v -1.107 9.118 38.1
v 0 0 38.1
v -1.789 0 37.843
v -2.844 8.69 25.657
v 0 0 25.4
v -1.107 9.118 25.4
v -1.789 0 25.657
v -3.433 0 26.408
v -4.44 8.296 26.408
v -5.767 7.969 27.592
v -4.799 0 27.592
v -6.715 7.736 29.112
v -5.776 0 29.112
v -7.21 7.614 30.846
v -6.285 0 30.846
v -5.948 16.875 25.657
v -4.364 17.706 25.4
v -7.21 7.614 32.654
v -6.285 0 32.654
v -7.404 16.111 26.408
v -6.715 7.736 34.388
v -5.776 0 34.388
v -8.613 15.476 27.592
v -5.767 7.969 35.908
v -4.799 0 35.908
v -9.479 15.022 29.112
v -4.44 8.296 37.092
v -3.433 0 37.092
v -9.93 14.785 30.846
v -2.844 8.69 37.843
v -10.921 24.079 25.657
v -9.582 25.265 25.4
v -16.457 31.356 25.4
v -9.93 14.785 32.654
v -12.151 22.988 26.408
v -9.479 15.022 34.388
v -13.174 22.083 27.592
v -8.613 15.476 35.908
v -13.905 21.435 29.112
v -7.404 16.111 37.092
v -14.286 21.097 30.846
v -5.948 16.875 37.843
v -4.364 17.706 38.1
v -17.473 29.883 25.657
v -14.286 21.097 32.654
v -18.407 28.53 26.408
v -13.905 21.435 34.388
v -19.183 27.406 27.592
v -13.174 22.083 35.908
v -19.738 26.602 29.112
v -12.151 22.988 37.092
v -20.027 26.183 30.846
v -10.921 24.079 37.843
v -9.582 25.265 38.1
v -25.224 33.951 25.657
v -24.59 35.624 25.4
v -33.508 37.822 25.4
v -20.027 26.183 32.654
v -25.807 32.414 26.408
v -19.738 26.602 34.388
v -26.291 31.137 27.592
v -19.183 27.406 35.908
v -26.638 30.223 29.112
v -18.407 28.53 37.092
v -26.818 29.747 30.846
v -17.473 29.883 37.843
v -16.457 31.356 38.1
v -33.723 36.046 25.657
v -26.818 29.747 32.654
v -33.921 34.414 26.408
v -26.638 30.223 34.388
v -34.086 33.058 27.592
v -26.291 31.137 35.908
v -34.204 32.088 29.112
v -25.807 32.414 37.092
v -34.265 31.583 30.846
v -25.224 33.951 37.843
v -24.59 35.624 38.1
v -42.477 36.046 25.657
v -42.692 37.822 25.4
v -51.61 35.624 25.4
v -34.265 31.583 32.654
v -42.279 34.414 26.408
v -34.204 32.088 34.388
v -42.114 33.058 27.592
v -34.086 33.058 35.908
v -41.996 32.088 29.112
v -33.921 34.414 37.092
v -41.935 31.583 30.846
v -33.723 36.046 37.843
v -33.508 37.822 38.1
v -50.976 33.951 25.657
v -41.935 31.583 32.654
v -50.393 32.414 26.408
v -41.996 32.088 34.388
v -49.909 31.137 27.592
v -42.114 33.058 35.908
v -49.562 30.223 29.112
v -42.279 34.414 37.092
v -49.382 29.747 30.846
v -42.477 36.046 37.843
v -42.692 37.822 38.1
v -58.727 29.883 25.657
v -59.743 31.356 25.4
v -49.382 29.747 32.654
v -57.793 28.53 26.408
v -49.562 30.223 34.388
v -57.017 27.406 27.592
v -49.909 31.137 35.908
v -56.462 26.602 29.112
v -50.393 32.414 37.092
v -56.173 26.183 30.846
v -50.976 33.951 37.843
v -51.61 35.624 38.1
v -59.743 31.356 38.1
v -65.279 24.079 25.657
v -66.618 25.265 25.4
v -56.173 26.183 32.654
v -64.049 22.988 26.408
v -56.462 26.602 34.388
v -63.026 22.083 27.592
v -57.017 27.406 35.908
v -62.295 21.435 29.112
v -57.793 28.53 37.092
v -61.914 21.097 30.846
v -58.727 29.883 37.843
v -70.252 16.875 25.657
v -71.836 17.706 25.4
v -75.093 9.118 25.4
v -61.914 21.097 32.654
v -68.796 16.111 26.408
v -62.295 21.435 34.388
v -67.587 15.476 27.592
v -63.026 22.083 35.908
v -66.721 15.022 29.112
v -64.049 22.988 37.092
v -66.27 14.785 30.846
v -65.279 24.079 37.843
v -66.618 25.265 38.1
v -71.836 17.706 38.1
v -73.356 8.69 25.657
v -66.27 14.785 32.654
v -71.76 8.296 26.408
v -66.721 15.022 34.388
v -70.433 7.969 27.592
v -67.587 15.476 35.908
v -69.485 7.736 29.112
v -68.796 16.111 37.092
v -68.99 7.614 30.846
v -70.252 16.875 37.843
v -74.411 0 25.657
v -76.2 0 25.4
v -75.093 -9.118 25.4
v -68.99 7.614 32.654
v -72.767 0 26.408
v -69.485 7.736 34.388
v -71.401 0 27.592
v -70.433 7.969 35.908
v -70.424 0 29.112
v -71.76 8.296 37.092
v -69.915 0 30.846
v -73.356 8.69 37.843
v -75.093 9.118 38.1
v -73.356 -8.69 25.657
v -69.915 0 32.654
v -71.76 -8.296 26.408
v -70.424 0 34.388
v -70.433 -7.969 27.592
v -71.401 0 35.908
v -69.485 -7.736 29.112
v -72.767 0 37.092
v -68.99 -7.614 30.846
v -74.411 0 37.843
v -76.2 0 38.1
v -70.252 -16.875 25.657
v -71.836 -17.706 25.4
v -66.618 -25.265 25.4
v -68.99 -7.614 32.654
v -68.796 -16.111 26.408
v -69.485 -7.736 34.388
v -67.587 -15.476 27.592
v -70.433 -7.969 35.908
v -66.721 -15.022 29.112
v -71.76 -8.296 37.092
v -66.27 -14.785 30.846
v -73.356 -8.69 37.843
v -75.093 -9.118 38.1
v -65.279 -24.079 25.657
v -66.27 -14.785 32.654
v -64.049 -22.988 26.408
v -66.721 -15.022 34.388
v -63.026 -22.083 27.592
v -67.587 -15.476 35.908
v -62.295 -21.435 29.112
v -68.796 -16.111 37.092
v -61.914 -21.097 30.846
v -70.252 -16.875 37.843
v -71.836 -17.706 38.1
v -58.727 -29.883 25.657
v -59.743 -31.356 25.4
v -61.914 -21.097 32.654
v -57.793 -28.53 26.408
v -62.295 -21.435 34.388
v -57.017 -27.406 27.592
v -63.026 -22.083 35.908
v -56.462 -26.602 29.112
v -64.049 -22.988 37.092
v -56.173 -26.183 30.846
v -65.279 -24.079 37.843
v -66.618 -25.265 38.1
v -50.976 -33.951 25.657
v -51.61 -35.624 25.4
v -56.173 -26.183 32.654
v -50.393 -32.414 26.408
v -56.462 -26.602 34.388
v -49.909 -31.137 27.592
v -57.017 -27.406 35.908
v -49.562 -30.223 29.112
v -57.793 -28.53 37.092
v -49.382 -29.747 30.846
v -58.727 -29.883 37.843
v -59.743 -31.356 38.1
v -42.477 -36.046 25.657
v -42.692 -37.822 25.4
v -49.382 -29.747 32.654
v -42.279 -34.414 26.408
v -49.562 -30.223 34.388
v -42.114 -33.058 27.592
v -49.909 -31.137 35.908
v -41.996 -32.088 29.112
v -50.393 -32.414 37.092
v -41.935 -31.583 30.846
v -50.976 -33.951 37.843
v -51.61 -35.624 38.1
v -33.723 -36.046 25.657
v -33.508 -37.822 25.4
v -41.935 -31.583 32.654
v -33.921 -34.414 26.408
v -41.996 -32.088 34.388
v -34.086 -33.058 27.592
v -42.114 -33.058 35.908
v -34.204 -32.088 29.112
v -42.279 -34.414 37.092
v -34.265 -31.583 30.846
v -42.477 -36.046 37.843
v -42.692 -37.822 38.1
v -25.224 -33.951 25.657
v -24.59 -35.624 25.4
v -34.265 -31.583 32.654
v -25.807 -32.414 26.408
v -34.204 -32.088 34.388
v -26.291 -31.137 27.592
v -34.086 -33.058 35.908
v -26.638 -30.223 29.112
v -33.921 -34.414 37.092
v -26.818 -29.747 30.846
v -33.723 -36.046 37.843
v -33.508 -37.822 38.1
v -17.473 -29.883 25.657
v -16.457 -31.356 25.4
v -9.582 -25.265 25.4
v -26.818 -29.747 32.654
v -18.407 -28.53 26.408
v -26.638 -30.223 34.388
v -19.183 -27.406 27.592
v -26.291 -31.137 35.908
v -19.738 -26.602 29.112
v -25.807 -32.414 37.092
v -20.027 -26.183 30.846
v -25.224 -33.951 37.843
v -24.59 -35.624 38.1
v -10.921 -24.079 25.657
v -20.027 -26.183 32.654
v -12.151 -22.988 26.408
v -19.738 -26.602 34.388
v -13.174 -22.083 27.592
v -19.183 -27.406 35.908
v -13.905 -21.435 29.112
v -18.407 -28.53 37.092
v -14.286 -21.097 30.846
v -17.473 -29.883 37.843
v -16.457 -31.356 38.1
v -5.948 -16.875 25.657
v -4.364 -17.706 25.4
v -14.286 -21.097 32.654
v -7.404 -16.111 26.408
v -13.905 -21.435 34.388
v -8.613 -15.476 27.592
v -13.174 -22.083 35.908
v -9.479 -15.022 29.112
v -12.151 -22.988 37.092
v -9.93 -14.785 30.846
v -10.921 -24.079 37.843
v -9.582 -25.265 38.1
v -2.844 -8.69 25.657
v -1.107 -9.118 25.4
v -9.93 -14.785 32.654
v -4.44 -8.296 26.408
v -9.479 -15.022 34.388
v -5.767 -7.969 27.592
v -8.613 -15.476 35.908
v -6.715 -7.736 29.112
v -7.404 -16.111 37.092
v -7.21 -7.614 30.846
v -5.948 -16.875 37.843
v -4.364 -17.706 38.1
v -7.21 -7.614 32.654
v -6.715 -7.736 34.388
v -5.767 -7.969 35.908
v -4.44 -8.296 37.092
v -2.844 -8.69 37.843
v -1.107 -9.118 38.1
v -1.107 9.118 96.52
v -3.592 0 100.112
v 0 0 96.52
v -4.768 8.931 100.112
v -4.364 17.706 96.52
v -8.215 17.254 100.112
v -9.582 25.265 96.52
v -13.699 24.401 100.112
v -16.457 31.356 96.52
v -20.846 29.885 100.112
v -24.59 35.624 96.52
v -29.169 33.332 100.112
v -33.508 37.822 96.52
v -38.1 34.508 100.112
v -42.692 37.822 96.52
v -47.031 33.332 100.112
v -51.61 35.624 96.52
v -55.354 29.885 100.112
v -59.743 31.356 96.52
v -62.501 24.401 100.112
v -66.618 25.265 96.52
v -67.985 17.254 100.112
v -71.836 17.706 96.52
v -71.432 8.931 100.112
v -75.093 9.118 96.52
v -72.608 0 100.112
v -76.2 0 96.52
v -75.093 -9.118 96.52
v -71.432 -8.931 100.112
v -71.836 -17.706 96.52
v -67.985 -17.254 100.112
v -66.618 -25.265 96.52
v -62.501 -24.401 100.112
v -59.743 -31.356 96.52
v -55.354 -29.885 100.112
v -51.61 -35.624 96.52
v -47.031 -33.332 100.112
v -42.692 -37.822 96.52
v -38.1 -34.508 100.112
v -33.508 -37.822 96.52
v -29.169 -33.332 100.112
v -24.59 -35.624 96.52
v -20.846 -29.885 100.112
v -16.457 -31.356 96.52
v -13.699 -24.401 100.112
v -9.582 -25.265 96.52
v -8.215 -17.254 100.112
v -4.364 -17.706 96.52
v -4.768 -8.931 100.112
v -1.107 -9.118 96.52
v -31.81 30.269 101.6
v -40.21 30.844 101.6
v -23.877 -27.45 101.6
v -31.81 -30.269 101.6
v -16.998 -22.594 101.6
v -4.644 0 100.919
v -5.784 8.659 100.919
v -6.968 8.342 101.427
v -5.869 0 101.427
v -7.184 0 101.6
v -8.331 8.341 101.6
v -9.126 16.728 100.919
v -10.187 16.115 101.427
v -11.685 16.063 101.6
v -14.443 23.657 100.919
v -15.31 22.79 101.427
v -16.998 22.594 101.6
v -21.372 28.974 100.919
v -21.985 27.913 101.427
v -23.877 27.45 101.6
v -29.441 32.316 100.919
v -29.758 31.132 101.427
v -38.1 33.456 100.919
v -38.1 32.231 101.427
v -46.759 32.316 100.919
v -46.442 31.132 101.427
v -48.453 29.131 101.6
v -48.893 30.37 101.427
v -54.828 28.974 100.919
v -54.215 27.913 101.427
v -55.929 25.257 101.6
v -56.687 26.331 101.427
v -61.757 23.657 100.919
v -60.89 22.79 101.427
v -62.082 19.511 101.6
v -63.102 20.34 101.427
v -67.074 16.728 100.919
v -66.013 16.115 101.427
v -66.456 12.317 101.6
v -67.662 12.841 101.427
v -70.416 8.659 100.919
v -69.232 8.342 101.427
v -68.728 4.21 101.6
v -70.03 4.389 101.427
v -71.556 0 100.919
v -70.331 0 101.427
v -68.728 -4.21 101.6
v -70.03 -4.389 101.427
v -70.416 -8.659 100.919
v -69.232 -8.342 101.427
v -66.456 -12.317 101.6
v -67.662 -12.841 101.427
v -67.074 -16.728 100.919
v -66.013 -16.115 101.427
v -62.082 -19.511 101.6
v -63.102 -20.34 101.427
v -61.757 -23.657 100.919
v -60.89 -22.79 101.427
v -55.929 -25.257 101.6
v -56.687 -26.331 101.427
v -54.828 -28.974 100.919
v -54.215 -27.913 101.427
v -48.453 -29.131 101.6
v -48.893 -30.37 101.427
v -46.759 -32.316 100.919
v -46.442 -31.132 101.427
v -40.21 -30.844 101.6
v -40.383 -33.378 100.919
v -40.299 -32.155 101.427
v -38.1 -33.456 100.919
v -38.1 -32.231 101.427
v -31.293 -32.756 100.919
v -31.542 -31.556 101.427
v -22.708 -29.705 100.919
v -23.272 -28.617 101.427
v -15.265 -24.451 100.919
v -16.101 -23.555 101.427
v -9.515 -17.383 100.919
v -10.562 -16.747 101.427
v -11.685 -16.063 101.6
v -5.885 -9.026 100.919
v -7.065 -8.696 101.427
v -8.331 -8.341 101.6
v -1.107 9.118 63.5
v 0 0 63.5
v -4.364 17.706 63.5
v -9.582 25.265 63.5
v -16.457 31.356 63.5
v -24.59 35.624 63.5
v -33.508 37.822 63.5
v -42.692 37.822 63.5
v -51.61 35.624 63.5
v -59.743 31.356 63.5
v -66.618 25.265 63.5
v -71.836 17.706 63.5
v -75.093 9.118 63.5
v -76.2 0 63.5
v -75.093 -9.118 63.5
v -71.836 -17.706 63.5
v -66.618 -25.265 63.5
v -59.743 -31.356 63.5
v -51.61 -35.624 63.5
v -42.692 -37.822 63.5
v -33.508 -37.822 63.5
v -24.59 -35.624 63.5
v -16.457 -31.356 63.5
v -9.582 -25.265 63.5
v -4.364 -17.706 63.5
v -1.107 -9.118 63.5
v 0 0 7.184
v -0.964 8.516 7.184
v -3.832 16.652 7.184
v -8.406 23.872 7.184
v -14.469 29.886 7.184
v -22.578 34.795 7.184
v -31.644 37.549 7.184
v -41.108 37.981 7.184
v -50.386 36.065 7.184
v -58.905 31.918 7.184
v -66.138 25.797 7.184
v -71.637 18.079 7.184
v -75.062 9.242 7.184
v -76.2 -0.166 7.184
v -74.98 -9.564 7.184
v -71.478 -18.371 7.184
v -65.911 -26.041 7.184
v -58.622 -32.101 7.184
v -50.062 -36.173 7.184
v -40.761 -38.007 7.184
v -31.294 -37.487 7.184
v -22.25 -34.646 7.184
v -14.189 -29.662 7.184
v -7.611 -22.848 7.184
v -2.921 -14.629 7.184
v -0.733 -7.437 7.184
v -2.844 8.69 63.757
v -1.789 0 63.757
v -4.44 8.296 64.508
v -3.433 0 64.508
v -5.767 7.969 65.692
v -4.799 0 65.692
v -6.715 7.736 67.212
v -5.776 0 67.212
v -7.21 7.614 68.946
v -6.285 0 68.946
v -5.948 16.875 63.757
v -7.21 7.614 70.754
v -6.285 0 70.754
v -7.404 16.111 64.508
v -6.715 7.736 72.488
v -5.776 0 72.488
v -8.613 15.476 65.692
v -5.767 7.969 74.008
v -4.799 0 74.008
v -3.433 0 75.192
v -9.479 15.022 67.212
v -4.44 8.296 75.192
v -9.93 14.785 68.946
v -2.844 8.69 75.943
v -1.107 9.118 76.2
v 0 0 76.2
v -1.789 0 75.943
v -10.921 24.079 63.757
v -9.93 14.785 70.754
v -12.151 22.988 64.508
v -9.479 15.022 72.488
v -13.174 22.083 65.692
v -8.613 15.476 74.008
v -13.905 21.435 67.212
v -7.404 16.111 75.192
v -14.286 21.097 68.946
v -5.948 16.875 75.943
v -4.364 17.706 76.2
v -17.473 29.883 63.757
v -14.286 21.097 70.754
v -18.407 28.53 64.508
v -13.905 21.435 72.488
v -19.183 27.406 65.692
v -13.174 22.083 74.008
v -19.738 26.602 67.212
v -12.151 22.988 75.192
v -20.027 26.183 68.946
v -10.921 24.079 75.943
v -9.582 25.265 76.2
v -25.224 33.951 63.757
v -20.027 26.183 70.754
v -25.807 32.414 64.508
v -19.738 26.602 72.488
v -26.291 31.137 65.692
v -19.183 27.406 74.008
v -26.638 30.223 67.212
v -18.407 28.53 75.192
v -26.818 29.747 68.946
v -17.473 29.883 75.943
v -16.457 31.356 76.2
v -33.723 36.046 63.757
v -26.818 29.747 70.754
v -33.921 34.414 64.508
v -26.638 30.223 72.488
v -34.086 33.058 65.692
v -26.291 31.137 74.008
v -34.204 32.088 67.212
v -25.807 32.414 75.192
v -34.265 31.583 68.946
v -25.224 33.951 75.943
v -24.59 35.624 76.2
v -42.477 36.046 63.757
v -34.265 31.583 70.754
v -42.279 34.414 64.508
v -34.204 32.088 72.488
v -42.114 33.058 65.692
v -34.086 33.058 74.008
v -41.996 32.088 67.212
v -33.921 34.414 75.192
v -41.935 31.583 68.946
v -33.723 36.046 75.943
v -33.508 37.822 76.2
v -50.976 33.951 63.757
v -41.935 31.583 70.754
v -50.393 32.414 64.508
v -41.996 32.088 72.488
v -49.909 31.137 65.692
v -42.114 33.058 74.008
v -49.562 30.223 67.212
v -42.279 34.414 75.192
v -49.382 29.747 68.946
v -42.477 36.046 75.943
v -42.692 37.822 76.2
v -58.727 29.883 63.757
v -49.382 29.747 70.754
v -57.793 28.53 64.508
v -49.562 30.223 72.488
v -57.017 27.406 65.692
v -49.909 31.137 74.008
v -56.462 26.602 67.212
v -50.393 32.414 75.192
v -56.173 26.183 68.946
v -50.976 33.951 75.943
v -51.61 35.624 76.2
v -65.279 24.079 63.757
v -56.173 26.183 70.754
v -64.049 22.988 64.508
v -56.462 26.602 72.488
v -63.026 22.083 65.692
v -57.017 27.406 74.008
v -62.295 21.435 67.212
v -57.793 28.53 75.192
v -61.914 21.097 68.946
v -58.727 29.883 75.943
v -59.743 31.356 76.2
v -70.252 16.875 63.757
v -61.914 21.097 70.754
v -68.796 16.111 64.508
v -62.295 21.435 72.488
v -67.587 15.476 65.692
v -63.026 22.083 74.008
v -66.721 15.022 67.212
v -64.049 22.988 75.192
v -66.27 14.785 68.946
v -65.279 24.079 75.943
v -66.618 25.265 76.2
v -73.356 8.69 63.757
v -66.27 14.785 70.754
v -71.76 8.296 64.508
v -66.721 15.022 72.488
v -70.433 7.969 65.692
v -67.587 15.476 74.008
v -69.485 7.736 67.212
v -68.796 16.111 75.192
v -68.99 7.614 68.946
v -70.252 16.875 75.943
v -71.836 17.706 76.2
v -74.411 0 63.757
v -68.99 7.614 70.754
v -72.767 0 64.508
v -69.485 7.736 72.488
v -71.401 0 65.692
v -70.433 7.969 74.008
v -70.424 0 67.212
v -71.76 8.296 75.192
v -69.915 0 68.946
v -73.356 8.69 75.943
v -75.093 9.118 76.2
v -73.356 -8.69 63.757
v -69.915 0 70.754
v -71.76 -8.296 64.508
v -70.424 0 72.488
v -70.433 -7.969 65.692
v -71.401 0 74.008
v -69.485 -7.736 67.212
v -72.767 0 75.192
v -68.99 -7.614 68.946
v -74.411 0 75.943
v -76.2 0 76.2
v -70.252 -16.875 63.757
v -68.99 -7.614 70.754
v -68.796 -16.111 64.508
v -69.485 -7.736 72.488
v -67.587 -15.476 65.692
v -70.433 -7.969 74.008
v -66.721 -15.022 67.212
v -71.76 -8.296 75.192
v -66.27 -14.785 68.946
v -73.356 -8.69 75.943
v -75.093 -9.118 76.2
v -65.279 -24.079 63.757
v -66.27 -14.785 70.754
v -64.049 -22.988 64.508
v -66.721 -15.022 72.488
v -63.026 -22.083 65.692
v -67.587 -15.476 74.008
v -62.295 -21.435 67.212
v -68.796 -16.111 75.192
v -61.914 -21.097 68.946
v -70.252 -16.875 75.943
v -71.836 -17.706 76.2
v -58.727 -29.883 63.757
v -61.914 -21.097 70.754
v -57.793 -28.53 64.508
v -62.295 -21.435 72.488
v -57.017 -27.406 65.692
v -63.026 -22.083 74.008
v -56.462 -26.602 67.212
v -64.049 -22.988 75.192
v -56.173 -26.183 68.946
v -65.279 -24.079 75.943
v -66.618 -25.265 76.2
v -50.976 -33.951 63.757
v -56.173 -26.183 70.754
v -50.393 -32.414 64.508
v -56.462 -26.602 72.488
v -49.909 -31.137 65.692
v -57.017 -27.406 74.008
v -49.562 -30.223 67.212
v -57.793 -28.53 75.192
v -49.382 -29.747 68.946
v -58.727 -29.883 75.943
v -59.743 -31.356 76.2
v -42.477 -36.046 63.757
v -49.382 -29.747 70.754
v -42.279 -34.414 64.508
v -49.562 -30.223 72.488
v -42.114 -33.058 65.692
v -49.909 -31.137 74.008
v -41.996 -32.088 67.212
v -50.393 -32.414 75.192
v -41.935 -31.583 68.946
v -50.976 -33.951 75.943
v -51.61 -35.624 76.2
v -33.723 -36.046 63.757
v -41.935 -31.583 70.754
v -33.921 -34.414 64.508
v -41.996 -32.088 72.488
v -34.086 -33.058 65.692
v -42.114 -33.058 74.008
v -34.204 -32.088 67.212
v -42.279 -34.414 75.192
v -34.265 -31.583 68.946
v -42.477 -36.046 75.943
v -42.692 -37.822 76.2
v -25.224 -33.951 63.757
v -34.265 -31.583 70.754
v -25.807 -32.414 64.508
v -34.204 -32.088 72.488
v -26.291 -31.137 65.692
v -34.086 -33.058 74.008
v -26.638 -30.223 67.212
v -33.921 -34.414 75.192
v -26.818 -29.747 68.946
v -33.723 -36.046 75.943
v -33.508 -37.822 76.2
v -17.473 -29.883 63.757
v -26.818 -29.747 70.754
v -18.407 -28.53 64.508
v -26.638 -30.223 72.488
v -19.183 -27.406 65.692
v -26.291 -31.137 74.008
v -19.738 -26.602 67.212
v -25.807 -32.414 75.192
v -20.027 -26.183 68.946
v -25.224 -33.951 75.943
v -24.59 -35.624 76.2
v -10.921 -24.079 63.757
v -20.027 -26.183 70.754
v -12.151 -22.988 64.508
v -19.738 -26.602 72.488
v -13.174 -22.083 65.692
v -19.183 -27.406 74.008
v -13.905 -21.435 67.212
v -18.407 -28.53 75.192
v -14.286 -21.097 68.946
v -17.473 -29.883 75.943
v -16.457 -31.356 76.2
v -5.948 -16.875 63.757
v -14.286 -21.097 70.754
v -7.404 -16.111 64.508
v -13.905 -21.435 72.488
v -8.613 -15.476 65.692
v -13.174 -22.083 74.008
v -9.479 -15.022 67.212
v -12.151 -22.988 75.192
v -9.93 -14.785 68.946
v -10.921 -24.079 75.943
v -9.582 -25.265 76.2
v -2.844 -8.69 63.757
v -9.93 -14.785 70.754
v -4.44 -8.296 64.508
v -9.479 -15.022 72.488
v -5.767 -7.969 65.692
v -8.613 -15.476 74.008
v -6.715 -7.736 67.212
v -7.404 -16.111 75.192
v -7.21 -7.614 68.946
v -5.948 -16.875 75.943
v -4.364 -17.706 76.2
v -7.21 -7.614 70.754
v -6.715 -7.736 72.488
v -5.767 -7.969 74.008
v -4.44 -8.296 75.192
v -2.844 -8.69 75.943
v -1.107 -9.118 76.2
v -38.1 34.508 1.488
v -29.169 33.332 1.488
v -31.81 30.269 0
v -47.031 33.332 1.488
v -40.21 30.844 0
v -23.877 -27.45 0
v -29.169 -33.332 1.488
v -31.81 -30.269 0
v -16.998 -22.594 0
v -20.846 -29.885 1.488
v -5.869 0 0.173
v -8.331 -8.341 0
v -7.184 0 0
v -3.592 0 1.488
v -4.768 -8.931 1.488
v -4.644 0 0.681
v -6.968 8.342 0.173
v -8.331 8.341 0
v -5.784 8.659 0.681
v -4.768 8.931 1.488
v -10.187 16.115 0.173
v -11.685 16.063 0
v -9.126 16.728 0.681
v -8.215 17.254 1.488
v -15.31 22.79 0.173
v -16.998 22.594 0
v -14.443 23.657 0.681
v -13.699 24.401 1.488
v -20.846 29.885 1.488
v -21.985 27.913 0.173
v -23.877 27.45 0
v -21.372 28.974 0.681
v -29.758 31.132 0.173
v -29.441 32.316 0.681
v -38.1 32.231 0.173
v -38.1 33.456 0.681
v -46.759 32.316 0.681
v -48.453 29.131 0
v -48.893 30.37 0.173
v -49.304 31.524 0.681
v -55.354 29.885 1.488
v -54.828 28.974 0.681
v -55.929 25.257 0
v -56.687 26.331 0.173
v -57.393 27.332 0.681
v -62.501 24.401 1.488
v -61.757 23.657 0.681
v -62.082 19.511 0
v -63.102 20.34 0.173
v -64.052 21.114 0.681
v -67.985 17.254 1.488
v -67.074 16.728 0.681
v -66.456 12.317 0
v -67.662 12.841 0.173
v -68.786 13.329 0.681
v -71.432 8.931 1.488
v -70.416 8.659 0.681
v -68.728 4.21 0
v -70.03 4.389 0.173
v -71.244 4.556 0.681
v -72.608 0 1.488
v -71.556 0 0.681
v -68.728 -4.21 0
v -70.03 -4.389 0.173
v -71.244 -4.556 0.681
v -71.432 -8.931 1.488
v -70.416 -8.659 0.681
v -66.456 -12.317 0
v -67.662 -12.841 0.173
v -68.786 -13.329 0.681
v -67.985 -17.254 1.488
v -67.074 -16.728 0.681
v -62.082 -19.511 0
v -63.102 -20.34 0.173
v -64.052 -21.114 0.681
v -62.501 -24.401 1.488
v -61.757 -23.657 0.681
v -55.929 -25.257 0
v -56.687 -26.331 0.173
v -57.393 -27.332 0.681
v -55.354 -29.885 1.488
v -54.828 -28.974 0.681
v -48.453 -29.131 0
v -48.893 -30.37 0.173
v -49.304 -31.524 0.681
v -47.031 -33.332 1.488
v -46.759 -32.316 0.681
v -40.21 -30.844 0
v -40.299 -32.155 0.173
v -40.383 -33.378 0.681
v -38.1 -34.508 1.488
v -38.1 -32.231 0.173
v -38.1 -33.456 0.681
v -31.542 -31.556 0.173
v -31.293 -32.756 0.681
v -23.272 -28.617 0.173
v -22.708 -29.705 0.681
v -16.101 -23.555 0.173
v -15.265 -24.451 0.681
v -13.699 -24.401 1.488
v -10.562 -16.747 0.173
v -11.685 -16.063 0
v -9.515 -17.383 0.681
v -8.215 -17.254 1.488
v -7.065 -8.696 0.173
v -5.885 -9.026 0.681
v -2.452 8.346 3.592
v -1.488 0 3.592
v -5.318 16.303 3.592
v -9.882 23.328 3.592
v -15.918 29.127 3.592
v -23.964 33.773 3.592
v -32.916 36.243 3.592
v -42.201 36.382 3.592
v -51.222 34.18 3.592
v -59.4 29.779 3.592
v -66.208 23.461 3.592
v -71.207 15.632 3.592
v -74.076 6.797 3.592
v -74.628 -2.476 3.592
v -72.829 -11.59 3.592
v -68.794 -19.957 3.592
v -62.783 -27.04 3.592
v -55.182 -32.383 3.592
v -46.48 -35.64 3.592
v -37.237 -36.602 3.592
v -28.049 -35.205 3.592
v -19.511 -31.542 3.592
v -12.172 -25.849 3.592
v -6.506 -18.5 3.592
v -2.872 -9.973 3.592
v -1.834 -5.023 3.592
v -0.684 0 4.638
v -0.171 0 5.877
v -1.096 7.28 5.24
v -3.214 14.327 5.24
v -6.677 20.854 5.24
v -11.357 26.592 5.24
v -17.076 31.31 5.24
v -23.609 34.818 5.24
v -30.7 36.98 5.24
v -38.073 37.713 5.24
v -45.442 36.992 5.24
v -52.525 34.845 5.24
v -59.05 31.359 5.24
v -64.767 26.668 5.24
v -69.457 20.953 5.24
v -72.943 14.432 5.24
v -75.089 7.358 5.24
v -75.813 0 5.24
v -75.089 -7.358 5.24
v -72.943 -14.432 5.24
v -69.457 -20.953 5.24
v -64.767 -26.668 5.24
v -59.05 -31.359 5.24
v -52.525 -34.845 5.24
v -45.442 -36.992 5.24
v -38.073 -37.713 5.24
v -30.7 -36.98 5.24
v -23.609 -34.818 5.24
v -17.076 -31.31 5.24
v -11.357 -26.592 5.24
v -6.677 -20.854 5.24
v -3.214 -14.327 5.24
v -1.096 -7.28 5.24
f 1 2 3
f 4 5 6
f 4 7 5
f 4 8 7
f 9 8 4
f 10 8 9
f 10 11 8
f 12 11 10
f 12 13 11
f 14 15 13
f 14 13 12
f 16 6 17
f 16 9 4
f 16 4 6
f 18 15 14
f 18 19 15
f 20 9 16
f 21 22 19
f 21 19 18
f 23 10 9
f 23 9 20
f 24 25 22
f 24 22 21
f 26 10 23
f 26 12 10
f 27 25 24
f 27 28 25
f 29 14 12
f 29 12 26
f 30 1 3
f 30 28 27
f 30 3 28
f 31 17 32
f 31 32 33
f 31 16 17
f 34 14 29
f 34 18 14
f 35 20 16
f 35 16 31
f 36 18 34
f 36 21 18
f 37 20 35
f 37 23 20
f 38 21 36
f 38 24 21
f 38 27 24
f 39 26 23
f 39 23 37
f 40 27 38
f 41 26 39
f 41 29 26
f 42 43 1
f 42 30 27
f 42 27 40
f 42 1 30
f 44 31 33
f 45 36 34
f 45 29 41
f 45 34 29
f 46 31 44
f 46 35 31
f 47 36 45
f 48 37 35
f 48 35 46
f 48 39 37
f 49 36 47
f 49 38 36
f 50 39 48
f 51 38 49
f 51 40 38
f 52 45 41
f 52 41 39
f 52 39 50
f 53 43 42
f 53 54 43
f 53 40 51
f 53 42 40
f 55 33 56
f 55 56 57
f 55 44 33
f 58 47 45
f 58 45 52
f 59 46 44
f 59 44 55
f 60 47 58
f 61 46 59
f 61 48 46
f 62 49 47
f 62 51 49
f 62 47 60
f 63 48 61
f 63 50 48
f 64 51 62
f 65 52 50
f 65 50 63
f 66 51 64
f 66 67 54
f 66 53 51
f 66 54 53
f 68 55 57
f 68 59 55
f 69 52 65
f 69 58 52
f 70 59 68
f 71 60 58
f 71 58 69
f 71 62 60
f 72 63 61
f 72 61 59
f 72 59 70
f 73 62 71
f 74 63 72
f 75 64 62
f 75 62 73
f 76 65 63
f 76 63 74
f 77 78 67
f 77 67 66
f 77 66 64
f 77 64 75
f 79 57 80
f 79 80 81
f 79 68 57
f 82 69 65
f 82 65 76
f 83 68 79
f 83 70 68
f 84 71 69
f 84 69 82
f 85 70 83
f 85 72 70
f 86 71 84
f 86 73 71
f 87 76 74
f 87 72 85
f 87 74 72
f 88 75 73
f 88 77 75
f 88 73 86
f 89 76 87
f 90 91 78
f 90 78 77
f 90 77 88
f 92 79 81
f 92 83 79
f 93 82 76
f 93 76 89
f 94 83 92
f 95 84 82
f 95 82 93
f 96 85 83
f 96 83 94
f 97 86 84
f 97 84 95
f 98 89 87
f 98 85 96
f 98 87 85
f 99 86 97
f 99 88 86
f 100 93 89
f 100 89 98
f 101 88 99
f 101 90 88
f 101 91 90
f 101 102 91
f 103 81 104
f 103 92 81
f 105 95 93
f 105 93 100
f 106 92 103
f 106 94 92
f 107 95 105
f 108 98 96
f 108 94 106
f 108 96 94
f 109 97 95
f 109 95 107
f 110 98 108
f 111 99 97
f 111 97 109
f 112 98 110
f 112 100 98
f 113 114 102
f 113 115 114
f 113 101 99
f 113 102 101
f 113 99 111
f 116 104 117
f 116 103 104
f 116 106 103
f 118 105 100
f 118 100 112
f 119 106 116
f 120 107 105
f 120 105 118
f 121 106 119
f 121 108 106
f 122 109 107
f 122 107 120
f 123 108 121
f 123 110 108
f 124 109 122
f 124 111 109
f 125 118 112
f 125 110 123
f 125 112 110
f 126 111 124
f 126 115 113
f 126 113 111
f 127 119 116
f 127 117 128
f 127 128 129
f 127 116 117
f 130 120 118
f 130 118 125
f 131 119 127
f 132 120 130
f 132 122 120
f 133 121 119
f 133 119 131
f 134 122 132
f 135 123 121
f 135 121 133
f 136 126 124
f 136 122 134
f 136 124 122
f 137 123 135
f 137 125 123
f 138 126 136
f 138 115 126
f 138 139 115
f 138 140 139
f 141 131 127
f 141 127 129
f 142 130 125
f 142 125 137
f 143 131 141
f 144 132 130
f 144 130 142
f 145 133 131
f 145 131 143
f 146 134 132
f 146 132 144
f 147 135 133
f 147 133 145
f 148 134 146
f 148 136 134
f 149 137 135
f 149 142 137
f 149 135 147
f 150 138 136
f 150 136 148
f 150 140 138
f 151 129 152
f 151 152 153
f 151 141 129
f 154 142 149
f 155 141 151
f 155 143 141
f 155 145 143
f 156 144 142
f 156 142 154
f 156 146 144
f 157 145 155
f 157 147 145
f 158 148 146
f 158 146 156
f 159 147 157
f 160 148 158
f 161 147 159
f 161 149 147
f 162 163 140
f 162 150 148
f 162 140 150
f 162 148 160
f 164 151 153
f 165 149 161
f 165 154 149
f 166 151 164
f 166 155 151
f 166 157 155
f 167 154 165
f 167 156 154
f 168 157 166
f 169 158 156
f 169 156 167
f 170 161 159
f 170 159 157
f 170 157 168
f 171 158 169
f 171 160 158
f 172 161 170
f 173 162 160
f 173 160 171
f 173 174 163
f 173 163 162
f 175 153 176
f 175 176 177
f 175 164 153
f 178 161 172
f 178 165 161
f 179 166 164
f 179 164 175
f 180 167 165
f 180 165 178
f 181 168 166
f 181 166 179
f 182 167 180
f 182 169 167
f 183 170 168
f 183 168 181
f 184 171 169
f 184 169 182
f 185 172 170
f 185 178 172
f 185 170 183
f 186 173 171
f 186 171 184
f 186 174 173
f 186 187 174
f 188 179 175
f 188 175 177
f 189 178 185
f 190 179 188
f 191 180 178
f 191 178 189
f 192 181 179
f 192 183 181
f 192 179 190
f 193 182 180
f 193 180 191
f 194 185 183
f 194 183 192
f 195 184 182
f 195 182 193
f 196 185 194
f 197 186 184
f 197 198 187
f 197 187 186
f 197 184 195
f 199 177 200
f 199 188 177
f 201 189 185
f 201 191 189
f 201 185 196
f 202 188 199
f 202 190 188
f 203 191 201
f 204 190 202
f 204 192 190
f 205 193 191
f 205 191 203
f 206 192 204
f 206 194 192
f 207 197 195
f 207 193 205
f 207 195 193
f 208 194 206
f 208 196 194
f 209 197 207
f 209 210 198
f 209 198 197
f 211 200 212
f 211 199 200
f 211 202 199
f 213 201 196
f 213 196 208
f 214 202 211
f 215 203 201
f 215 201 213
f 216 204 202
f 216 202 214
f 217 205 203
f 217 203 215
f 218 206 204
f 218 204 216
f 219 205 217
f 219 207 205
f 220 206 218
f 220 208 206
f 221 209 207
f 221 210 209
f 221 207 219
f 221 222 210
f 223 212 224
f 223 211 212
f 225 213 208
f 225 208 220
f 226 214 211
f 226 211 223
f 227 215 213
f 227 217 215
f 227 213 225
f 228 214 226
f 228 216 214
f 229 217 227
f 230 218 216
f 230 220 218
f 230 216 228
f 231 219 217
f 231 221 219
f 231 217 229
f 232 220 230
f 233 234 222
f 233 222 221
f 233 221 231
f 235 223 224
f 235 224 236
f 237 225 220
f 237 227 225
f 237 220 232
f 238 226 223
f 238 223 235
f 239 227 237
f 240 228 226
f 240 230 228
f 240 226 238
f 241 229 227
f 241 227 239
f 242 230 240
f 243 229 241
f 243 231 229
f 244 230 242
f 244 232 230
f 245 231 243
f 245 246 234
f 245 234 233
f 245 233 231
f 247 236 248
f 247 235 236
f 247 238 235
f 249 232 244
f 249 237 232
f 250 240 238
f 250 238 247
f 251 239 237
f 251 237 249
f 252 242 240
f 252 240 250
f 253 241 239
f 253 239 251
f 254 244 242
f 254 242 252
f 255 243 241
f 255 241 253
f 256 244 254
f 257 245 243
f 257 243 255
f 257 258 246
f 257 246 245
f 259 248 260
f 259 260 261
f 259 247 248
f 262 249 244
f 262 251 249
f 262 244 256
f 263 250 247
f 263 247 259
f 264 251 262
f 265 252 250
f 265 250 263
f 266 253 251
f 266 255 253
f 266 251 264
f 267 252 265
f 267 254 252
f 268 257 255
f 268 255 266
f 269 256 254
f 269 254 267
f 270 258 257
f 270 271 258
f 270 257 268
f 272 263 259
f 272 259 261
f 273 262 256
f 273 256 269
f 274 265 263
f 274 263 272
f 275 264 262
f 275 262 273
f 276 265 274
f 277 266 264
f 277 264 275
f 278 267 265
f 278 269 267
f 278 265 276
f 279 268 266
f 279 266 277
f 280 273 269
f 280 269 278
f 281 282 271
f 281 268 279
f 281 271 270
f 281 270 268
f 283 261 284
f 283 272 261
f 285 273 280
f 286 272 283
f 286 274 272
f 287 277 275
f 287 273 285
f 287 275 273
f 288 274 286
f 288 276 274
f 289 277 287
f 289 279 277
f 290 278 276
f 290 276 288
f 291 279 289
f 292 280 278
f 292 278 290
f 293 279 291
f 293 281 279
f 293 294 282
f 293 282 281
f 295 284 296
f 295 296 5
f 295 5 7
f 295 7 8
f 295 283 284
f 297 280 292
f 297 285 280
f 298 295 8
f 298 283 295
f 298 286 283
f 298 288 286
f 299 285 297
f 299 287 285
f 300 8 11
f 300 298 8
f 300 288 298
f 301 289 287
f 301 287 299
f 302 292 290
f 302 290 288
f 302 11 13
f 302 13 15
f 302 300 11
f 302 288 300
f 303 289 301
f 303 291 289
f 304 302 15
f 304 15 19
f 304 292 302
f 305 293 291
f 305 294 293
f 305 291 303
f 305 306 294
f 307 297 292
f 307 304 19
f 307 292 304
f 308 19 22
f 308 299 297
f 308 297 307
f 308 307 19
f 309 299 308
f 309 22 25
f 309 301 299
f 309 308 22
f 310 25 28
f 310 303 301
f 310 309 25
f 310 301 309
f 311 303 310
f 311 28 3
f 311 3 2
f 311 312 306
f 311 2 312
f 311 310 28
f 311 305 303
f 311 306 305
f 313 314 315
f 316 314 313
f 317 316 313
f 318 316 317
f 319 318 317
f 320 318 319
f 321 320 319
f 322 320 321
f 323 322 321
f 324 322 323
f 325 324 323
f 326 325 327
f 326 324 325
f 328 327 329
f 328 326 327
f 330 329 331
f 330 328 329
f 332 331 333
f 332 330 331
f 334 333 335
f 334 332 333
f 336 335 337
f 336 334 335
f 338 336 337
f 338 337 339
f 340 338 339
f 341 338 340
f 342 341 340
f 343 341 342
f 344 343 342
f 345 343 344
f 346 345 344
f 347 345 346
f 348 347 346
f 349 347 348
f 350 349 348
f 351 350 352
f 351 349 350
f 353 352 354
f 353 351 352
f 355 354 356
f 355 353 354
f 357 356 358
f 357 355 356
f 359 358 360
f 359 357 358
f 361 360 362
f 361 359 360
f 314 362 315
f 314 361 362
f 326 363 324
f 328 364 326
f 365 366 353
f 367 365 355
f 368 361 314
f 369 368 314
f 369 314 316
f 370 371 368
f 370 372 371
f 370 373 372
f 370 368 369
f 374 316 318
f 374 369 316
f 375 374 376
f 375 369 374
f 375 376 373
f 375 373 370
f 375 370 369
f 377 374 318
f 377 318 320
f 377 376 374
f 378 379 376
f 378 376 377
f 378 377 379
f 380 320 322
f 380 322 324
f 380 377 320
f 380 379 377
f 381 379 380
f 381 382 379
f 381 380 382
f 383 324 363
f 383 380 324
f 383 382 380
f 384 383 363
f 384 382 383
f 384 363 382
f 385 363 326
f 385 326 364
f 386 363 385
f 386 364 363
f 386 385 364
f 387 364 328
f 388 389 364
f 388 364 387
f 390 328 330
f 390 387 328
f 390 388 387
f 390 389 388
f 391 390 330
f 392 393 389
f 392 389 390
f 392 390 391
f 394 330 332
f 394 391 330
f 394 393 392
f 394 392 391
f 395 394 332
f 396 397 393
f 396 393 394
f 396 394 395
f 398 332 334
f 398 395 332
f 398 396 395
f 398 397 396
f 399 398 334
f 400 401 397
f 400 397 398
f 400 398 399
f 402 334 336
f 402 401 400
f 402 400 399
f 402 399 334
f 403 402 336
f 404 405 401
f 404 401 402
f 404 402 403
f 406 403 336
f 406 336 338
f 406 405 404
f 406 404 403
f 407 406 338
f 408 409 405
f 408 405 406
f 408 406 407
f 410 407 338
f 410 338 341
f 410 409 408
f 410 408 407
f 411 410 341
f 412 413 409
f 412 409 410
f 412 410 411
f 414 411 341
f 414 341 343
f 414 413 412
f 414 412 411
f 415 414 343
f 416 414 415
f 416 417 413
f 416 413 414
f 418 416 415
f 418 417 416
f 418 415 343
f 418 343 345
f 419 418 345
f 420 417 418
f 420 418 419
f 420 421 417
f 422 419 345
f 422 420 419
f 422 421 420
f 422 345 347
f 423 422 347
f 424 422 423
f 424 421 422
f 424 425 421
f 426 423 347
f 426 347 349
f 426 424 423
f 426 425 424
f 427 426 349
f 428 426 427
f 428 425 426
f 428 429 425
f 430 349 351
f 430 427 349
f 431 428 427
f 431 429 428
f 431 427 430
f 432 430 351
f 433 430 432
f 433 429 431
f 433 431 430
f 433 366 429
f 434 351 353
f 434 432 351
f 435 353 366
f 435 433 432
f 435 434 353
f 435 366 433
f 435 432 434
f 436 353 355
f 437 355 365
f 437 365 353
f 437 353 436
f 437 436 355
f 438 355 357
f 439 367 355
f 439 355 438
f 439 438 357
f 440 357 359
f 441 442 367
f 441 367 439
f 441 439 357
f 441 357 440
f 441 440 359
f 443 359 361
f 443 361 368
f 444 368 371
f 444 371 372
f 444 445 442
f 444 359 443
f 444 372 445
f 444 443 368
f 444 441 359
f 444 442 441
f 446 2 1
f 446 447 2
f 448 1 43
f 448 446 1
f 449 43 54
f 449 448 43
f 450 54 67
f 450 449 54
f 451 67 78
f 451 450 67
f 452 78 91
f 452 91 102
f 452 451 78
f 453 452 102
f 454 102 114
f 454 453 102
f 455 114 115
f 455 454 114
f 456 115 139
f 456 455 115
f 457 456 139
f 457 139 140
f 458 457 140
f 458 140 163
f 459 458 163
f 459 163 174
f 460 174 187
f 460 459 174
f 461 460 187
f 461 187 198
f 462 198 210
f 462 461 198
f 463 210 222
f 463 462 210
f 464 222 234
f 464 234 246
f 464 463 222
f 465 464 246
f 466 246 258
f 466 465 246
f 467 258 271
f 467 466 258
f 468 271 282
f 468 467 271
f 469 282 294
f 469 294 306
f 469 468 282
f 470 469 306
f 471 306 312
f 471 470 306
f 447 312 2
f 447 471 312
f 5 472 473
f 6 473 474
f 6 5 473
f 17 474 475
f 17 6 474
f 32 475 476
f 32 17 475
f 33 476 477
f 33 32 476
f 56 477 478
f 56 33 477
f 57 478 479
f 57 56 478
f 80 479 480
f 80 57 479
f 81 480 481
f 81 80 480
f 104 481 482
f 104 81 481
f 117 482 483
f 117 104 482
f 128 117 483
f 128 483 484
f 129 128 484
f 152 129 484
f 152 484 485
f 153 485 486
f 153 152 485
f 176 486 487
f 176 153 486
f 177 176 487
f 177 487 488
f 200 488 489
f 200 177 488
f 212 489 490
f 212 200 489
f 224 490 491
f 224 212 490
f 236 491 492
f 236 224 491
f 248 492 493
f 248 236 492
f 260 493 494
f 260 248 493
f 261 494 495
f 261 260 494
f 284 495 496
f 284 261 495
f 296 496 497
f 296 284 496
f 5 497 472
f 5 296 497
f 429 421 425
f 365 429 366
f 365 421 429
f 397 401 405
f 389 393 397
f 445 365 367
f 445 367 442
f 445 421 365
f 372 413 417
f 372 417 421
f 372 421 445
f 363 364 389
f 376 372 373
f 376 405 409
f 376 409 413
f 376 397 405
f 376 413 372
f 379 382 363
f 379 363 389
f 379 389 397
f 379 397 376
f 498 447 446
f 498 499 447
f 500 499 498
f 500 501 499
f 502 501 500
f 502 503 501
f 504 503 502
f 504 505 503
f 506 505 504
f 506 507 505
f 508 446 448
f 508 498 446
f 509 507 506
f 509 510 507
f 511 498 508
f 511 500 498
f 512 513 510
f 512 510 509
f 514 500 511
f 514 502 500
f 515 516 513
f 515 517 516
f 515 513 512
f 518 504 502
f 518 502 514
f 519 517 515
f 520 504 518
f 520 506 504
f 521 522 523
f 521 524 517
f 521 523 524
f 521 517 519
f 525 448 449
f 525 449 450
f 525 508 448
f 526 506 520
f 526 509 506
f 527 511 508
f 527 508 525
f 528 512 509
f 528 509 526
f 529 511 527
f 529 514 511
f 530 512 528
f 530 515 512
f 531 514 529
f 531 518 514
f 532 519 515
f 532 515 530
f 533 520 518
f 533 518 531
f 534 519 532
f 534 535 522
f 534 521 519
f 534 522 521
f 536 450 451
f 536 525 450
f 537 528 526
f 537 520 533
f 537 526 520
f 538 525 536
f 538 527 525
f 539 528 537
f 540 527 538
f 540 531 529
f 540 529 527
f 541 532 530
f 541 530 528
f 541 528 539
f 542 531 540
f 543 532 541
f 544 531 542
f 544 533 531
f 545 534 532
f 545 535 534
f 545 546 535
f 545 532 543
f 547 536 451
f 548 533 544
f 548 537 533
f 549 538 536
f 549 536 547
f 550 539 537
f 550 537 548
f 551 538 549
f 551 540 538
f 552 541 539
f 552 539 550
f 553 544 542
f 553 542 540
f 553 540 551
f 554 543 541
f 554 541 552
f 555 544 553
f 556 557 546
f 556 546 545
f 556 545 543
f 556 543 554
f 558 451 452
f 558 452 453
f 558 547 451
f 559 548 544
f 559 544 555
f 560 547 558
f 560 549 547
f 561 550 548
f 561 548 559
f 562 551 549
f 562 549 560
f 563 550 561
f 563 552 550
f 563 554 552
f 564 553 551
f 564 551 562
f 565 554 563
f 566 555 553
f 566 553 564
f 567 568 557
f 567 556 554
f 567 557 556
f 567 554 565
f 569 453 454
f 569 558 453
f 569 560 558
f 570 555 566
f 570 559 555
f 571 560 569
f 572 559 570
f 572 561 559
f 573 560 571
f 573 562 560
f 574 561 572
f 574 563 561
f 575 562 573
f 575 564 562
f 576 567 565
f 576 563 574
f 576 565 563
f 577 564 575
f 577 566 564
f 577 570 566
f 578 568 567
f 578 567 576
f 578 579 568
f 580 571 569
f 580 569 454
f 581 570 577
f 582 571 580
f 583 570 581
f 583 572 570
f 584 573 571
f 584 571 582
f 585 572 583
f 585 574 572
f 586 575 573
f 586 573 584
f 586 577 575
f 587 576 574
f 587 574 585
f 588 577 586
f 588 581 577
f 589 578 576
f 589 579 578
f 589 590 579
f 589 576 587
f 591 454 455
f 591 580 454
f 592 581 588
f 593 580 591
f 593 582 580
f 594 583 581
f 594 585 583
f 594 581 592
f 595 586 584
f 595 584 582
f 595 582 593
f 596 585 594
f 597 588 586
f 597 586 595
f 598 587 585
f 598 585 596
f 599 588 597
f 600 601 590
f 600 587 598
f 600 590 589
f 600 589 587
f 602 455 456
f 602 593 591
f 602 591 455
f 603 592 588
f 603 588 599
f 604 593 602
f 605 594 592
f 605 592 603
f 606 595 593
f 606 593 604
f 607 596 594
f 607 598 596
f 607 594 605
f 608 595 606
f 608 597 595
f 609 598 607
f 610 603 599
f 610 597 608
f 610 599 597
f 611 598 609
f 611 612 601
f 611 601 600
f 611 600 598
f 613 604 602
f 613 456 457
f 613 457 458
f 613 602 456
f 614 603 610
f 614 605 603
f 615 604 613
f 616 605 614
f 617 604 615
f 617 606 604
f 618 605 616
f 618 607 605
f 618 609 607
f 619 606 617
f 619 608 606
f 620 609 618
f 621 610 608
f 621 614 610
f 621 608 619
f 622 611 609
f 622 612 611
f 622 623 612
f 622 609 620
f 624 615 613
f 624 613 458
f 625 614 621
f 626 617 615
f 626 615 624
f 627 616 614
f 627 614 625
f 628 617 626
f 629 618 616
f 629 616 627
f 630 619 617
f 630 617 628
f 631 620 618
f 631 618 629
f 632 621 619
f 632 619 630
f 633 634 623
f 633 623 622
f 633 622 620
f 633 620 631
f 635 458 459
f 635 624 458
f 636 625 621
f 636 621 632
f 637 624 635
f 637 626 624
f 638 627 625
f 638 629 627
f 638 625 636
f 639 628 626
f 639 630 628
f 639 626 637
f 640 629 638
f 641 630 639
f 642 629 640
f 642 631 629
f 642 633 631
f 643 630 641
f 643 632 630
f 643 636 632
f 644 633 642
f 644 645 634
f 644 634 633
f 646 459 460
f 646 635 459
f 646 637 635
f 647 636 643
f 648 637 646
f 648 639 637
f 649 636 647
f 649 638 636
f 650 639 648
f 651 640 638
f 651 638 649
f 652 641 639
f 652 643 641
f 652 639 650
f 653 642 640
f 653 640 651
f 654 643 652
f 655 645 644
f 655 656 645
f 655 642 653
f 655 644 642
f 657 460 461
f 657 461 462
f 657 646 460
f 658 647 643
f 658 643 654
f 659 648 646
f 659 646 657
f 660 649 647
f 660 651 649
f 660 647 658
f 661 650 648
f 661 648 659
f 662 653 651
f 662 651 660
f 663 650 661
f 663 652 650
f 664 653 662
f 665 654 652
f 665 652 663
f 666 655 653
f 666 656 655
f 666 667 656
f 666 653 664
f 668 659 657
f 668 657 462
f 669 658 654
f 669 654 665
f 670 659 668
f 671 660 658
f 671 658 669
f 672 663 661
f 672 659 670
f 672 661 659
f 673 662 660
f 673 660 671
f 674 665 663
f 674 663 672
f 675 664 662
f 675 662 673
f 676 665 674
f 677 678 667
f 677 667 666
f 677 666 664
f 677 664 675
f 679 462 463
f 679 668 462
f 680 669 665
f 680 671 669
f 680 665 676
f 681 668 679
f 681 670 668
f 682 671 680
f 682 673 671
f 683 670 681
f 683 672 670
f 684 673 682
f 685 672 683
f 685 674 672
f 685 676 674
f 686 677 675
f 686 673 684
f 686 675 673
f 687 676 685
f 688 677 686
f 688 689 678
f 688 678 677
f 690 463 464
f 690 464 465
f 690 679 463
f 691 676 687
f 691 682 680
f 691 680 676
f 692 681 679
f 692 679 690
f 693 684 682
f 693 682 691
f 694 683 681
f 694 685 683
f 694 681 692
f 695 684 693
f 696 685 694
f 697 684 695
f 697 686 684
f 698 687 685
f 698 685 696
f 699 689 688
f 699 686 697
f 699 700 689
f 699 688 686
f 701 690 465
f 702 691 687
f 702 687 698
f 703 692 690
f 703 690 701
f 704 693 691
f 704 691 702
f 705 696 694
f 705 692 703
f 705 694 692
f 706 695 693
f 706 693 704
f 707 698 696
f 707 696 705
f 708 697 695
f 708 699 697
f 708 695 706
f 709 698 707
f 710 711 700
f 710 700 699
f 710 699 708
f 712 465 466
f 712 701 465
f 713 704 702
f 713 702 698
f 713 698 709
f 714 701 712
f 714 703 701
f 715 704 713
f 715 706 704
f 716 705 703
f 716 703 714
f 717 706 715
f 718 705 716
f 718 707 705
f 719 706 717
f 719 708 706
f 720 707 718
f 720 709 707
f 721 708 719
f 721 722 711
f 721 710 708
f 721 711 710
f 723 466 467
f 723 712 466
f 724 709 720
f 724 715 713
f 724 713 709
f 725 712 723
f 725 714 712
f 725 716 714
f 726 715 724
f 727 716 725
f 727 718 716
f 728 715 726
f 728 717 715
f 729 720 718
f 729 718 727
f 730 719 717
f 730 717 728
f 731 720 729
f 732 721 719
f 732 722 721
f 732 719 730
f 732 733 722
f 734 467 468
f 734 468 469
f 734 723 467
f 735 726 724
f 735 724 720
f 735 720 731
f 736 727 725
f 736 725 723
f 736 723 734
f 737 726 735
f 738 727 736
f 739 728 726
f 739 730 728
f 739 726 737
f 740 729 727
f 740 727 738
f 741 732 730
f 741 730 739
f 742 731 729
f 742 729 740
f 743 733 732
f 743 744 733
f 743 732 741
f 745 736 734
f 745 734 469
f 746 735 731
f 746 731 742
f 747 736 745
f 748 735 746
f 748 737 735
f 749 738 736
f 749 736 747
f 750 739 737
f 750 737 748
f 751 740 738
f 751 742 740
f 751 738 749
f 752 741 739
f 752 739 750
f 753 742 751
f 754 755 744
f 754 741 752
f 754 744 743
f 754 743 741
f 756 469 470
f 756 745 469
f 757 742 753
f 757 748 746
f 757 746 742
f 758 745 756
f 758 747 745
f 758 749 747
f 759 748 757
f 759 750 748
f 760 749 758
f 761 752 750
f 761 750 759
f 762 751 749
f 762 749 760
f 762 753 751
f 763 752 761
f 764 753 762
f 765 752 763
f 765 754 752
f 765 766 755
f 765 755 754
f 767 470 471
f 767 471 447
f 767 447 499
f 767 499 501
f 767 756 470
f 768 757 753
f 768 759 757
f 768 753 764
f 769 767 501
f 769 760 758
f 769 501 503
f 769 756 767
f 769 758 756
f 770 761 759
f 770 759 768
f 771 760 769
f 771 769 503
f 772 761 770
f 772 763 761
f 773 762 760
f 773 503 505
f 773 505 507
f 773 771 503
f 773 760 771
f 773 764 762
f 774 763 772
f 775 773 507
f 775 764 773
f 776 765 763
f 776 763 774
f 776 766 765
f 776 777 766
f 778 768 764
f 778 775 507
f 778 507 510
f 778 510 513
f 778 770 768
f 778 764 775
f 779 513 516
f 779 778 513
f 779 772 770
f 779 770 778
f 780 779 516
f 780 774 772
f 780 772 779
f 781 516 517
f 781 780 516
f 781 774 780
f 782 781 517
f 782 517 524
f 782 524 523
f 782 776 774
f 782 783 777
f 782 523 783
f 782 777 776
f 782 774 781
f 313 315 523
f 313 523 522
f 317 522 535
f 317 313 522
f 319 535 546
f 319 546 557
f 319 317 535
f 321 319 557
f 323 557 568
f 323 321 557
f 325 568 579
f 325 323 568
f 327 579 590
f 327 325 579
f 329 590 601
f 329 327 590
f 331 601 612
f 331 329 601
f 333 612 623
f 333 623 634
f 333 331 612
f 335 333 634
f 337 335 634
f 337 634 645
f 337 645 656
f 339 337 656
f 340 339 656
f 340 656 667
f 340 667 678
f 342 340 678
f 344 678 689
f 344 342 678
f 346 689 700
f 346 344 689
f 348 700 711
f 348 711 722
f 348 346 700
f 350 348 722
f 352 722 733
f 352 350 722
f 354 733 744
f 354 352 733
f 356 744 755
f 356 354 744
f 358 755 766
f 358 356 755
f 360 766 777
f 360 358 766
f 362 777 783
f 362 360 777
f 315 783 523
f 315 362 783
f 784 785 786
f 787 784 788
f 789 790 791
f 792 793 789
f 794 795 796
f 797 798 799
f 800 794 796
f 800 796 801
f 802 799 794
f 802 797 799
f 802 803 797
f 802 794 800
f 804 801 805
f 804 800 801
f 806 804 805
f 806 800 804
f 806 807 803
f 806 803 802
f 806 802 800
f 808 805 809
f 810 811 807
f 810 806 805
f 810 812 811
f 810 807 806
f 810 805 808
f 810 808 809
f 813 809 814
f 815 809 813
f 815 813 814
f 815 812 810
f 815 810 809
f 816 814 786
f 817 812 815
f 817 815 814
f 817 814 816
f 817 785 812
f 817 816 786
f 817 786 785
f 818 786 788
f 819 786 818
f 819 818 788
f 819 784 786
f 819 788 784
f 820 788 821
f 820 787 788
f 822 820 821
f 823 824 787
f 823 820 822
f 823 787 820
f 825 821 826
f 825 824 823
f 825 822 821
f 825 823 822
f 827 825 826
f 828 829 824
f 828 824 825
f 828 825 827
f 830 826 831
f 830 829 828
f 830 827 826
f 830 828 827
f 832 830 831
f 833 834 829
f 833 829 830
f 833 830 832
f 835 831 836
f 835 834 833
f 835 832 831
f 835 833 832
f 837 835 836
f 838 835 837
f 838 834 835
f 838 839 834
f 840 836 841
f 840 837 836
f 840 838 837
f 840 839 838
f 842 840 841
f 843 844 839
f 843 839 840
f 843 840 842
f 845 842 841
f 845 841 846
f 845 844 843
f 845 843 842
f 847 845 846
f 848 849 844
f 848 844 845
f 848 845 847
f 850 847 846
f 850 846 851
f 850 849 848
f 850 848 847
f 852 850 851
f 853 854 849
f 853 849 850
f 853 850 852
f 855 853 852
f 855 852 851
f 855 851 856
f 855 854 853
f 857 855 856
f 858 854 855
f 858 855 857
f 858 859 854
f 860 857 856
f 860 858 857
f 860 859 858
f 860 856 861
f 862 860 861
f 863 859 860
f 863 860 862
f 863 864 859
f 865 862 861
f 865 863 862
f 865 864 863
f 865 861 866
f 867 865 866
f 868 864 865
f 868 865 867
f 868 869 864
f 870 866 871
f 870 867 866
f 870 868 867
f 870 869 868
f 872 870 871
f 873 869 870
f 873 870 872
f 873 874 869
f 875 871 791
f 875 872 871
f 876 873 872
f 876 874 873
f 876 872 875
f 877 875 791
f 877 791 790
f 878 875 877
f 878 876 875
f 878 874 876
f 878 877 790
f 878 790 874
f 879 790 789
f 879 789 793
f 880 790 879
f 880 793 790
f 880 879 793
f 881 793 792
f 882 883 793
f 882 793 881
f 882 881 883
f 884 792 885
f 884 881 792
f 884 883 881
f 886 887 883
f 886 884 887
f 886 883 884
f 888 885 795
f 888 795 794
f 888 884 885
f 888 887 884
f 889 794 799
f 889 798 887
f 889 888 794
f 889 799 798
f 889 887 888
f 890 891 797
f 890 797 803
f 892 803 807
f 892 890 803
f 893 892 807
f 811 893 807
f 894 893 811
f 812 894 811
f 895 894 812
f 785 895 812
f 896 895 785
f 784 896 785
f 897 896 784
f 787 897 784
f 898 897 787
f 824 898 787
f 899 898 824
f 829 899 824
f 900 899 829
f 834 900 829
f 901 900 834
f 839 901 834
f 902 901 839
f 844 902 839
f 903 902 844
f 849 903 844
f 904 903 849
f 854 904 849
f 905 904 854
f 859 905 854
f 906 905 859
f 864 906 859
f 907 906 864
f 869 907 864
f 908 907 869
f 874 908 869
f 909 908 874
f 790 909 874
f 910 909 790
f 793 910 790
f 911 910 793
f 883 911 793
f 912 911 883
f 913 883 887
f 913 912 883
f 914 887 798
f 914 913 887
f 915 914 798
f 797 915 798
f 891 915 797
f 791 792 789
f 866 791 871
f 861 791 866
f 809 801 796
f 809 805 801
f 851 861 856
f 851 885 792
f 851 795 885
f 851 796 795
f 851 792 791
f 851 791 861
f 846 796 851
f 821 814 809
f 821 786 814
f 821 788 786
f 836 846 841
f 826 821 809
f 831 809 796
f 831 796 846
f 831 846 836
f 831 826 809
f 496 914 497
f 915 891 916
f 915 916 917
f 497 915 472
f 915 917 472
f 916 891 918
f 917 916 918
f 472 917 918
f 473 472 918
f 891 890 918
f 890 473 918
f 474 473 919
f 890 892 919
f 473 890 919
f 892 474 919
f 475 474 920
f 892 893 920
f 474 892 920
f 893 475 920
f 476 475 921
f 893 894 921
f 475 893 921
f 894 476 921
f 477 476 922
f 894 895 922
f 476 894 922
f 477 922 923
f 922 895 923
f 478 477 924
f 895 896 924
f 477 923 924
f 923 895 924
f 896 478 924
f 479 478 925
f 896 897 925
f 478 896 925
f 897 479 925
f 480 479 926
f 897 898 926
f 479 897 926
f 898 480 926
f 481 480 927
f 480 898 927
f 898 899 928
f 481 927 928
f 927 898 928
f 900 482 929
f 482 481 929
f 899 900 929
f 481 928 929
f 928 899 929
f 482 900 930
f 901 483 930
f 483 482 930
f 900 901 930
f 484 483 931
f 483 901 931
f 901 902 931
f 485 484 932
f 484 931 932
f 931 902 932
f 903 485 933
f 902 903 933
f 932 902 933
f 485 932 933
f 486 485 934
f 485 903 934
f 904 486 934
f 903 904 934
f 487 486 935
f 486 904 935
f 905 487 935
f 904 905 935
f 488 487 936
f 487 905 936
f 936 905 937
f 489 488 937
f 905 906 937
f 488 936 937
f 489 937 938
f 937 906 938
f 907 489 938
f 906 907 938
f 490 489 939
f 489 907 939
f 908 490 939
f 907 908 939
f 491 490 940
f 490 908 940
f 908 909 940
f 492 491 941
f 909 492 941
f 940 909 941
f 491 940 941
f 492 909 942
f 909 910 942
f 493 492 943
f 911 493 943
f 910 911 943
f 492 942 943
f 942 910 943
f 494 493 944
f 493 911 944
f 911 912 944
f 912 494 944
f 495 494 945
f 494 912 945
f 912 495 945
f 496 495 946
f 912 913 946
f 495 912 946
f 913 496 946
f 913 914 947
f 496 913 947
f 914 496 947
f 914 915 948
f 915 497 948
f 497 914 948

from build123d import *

# Parameters (mm, degrees)
F2_SIZE = 5.08
F3_R    = 5.08
F4_SIZE = 5.08
F5_R    = 5.08


with BuildPart() as f1:
    # F0 (on Front) → F1 (revolve)
    with BuildSketch(Plane.XZ):
        with BuildLine():
            Line((-38.1, 0), (0, 0))
            Line((0, 0), (0, 25.4))
            ThreePointArc((0, 25.4), (-6.35, 31.75), (0, 38.1))
            Line((0, 38.1), (0, 63.5))
            ThreePointArc((0, 63.5), (-6.35, 69.85), (0, 76.2))
            Line((0, 76.2), (0, 101.6))
            Line((0, 101.6), (-38.1, 101.6))
            Line((-38.1, 101.6), (-38.1, 0))
        make_face()
    revolve(axis=Axis((-38.1, 0, 50.8), (0, 0, 1)))

    # F2
    f2_edges = [f1.edges().sort_by_distance(p)[0] for p in [
        (-76.2, 0, 0),
    ]]
    chamfer(f2_edges, length=F2_SIZE)

    # F3
    f3_edges = [f1.edges().sort_by_distance(p)[0] for p in [
        (-2.54, 0, 2.54),
        (-71.12, 0, 0),
        (-76.2, 0, 5.08),
    ]]
    fillet(f3_edges, radius=F3_R)

    # F4
    f4_edges = [f1.edges().sort_by_distance(p)[0] for p in [
        (-76.2, 0, 101.6),
    ]]
    chamfer(f4_edges, length=F4_SIZE)

    # F5
    f5_edges = [f1.edges().sort_by_distance(p)[0] for p in [
        (-71.12, 0, 101.6),
    ]]
    fillet(f5_edges, radius=F5_R)


solid = f1.part
